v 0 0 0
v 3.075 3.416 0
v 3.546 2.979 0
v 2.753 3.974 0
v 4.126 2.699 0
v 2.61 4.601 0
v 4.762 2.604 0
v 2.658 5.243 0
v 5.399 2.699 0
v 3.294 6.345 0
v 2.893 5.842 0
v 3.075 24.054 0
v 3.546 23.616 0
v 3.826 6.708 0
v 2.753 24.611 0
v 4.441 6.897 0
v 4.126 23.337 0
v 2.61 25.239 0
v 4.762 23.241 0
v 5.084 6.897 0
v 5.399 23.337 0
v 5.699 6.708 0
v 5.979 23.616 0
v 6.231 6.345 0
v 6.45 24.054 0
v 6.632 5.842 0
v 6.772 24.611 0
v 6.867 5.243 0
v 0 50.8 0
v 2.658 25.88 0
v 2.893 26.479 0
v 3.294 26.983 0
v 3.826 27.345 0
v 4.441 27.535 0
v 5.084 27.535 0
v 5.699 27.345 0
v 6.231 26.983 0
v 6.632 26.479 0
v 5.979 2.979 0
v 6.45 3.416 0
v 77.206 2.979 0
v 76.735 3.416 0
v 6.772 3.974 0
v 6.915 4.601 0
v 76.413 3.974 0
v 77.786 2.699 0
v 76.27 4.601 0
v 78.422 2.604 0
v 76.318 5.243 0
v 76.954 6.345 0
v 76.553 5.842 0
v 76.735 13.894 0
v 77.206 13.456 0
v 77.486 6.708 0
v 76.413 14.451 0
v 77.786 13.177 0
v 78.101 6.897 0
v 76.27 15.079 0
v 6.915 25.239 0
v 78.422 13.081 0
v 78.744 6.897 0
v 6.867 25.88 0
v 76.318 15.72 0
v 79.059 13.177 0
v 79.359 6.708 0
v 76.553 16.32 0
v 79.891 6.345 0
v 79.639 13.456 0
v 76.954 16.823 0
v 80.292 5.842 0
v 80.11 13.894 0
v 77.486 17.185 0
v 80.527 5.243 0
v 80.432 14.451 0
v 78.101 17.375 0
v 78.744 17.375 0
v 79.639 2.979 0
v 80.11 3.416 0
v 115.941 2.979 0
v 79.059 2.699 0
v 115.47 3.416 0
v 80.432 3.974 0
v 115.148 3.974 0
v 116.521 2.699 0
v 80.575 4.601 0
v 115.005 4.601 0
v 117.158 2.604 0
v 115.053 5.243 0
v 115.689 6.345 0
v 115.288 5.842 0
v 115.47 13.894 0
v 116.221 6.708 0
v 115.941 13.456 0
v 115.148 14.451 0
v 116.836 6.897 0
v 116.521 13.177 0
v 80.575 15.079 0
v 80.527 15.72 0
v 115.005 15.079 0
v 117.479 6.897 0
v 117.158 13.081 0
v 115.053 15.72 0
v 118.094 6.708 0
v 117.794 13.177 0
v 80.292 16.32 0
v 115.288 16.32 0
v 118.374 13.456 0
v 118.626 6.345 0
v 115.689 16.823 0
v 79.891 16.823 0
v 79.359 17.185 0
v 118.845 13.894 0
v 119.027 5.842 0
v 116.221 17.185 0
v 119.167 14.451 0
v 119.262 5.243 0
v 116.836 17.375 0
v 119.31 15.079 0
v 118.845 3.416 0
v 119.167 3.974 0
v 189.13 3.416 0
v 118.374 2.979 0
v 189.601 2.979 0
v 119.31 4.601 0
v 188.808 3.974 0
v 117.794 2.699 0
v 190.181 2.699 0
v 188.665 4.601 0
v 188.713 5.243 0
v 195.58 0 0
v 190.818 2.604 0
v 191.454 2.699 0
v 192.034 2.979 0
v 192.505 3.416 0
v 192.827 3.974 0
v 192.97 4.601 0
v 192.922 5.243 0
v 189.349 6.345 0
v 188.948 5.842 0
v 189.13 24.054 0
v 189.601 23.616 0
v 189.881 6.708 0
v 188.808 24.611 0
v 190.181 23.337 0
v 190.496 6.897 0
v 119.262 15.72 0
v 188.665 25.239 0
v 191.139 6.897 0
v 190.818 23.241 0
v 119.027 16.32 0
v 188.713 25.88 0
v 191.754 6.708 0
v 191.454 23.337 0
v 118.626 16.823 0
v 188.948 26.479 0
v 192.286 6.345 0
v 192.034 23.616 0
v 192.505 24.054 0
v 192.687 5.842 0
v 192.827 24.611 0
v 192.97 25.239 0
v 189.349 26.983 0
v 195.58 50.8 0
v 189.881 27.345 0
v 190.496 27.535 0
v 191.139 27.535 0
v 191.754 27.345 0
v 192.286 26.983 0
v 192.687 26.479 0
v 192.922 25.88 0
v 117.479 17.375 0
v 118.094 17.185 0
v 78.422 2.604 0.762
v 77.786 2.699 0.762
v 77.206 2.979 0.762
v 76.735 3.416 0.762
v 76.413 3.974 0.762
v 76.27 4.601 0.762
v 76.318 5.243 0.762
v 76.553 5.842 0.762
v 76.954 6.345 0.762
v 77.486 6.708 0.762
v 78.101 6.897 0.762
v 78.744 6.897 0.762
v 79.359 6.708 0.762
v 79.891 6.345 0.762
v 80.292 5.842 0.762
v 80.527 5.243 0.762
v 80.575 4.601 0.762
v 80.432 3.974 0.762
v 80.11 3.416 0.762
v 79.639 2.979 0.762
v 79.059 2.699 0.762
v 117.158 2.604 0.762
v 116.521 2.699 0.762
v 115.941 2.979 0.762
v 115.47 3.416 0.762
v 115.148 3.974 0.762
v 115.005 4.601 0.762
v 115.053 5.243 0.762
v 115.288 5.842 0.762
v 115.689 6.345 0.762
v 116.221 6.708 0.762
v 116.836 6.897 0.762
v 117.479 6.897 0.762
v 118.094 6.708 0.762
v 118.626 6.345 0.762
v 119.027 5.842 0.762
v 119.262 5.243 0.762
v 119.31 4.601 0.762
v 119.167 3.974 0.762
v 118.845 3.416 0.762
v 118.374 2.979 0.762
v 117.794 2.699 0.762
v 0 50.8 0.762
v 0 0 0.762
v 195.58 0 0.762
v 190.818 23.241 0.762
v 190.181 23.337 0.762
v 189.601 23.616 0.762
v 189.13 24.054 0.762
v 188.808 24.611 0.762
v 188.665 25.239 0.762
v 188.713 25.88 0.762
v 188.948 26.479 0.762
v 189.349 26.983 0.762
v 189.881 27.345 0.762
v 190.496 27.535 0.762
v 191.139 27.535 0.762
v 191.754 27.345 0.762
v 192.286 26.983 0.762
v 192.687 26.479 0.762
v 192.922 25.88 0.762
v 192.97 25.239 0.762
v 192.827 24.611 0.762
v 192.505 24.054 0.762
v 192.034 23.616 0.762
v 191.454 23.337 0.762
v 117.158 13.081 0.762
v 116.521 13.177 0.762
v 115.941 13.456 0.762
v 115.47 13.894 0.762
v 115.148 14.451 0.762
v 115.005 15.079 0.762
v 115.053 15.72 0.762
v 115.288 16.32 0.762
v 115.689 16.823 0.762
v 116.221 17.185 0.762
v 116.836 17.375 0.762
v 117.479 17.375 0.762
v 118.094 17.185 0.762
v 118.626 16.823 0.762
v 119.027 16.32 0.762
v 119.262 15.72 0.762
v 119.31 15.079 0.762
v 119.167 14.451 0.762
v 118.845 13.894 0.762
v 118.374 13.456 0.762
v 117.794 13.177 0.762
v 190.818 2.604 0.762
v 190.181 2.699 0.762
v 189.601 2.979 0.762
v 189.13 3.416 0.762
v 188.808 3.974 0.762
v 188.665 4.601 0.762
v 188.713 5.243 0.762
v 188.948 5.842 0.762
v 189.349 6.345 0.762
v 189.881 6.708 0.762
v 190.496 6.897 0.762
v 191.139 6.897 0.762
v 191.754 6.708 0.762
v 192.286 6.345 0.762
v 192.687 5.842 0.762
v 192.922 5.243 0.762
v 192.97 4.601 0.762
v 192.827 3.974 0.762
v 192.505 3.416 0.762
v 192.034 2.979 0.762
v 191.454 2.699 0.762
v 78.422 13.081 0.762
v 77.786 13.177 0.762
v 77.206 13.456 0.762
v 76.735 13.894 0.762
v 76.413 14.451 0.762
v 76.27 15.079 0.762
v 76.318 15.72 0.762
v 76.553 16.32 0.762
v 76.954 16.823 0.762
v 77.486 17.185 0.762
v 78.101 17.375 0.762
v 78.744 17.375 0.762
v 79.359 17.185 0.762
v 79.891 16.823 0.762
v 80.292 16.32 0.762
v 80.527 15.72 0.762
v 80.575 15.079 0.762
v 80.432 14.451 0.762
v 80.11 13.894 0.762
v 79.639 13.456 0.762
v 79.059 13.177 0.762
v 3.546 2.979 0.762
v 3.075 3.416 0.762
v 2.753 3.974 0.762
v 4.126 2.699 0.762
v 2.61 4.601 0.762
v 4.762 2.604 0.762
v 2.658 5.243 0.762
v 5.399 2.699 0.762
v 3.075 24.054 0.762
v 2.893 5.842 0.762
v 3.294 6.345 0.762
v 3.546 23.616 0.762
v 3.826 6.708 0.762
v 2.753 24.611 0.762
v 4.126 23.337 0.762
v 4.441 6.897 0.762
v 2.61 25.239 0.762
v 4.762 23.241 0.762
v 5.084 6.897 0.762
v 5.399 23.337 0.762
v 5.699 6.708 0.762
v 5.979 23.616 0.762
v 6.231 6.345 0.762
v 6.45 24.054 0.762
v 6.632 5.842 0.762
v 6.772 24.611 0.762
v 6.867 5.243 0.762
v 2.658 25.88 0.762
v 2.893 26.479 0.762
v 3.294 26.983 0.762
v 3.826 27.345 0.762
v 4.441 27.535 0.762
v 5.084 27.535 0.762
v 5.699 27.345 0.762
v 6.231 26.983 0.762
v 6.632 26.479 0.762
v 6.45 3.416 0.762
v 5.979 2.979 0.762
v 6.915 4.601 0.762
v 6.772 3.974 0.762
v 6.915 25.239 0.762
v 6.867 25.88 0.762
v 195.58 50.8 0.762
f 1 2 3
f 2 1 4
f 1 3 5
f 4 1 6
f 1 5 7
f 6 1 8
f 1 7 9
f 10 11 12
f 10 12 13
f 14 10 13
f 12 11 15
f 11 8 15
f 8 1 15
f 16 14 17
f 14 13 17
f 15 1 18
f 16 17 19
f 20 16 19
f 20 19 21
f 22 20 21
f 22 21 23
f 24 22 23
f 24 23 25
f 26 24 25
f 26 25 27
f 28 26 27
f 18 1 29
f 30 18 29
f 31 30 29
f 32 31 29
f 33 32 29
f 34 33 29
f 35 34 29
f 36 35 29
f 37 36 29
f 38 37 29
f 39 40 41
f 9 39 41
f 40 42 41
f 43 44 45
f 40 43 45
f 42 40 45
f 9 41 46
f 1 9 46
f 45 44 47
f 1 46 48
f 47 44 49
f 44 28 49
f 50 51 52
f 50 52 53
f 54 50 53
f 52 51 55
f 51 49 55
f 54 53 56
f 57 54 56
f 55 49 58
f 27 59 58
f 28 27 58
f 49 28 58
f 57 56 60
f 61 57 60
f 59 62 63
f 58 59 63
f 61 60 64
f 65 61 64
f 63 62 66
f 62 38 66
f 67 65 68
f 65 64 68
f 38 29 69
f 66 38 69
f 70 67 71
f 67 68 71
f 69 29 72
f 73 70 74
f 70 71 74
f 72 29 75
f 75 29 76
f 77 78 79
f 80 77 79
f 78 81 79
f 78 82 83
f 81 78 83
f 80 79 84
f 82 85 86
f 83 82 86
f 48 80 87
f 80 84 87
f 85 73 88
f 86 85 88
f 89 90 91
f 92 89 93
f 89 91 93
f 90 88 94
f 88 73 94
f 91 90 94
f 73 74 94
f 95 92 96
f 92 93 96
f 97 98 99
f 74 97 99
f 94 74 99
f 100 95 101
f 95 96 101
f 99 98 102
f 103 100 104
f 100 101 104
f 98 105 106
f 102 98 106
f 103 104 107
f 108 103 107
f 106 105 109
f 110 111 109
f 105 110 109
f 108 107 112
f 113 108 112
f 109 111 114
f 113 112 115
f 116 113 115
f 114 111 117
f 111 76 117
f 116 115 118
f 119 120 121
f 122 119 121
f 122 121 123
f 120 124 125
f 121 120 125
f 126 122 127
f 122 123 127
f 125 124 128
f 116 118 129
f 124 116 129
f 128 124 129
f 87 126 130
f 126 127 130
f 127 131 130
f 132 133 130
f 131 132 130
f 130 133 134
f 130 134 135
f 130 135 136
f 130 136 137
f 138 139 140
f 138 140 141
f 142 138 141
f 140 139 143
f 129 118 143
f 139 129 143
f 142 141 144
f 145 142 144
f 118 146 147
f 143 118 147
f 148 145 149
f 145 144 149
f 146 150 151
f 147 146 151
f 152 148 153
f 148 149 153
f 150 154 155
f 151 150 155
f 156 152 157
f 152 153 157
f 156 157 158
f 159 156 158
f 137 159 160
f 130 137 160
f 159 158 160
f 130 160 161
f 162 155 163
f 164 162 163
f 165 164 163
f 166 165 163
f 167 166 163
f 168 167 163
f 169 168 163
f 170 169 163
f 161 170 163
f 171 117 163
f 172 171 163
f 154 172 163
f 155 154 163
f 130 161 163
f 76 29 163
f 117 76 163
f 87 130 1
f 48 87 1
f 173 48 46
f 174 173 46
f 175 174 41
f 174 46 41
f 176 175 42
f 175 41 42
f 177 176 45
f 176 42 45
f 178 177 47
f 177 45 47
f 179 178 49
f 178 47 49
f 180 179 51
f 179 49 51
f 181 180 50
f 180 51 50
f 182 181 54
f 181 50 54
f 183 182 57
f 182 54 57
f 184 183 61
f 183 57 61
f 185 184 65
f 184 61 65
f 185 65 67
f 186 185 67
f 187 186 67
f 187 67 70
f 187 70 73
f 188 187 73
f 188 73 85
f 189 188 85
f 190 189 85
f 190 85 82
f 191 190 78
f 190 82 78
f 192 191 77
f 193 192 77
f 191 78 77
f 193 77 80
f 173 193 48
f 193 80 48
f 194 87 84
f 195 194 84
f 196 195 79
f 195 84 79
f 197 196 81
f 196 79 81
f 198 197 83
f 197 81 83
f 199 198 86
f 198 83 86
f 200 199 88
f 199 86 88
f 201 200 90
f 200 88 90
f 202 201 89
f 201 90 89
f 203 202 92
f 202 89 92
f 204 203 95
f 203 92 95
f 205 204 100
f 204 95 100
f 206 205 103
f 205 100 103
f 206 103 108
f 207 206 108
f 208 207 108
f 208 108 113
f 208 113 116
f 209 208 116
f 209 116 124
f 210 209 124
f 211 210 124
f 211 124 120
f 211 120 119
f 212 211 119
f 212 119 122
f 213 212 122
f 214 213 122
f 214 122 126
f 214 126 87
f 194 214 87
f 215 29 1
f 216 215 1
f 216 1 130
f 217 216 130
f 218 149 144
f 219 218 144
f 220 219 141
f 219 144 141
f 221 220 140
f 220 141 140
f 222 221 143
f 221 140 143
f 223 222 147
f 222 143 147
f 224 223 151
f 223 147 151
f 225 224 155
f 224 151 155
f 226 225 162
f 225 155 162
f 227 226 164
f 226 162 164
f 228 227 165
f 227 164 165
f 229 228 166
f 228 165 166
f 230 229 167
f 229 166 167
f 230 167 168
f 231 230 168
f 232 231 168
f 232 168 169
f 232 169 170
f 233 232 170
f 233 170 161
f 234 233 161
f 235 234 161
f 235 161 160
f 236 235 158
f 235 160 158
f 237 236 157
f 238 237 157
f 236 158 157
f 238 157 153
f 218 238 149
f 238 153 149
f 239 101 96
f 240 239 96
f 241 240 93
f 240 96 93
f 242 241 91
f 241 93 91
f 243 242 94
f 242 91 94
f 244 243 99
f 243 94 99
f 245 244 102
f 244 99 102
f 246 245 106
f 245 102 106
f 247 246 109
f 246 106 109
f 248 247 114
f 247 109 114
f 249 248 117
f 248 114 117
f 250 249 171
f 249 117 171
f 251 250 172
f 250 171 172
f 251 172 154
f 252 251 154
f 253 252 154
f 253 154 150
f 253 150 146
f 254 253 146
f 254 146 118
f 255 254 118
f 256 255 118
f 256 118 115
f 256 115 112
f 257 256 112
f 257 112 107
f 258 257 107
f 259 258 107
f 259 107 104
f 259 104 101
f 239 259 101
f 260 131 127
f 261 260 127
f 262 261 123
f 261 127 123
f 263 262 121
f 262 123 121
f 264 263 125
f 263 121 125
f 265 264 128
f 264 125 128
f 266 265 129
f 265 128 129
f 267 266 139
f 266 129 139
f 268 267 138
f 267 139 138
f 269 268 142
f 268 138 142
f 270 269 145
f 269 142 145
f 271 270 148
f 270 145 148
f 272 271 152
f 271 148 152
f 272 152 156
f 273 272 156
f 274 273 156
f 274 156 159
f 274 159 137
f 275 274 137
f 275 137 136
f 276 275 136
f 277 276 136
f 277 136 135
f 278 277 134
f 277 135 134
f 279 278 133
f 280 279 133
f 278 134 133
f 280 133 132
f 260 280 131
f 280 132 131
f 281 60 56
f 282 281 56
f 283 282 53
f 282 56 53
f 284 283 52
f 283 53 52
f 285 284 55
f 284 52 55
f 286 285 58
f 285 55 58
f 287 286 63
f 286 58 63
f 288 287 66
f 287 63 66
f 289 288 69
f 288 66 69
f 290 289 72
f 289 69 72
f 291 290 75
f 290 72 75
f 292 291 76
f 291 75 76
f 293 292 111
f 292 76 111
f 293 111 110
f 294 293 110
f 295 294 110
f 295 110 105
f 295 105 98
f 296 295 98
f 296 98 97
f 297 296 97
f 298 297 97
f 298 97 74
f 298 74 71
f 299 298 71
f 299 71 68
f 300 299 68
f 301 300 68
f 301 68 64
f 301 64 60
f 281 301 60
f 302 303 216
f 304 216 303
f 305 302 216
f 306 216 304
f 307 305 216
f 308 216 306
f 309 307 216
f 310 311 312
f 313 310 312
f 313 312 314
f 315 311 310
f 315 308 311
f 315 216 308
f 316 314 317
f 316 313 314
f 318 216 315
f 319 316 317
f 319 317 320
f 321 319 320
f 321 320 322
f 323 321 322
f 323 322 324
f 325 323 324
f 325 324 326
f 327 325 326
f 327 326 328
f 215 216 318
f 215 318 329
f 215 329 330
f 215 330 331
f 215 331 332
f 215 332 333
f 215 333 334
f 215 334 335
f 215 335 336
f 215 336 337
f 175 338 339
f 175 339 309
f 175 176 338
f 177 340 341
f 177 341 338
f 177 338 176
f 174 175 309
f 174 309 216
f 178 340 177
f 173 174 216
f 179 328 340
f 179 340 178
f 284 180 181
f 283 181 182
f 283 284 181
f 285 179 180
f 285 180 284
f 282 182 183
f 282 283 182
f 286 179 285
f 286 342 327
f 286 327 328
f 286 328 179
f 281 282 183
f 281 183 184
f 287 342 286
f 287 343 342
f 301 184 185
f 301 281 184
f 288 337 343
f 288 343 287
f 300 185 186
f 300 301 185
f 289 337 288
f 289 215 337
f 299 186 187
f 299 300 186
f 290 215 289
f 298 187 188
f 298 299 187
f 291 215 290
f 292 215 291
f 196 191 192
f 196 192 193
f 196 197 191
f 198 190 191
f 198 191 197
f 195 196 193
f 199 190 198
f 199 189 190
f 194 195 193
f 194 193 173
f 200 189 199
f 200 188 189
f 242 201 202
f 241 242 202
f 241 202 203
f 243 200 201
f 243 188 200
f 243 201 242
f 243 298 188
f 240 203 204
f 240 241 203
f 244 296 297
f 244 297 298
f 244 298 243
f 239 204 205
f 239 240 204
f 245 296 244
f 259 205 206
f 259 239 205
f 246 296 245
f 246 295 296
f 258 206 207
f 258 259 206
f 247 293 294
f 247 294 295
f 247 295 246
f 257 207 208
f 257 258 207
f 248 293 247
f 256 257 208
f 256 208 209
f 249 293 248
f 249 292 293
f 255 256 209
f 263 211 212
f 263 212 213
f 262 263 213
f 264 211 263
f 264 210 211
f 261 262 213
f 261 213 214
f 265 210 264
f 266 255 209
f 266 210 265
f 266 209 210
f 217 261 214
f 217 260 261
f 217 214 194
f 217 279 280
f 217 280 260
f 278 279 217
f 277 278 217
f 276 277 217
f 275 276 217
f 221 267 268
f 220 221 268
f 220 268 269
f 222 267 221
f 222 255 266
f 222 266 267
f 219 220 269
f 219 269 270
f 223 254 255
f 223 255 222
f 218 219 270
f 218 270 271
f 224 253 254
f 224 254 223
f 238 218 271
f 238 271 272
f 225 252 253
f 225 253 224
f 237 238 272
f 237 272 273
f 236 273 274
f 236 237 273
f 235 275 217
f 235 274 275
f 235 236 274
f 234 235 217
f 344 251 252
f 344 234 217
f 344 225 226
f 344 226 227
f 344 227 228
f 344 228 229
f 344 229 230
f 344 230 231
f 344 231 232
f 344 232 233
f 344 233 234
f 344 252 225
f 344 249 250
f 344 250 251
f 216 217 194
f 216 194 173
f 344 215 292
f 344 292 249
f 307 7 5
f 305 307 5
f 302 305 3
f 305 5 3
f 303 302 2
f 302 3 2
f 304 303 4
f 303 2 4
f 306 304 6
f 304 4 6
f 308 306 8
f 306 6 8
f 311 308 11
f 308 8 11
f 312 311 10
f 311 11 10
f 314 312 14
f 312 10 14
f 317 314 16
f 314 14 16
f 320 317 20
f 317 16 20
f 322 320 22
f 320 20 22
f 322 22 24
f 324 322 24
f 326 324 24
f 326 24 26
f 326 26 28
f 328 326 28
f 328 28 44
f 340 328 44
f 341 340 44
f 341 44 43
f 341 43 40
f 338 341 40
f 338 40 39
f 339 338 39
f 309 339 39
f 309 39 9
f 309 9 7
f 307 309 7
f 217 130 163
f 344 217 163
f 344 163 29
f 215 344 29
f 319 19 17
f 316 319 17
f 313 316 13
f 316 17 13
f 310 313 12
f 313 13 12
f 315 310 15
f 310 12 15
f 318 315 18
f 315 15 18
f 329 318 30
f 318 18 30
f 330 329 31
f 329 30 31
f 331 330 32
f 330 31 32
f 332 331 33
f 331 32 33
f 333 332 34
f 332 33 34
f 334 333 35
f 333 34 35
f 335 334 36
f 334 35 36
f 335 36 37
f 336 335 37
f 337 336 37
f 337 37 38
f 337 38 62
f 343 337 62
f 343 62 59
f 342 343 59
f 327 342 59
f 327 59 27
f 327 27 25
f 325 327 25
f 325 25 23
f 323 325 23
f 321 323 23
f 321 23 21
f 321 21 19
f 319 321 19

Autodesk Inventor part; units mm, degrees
ref_plane "YZ Plane" through (0, 0, 0) normal (1, 0, 0) x (0, 1, 0)
ref_plane "XZ Plane" through (0, 0, 0) normal (0, 1, 0) x (-1, 0, 0)
ref_plane "XY Plane" through (0, 0, 0) normal (0, 0, 1) x (1, 0, 0)
sketch "Sketch1" plane through (0, 0, 0) normal (0, 0, 1) x (1, 0, 0)
  line L0 (0, 0) -> (195.58, 0)
  line L1 (195.58, 0) -> (195.58, 50.8)
  line L2 (195.58, 50.8) -> (0, 50.8)
  line L3 (0, 50.8) -> (0, 0)
  dimension "d0" = 195.58
  dimension "d1" = 50.8
extrude "Extrusion1" add sketch "Sketch1" along normal blind 0.762
sketch "Sketch2" plane through (0, 0, 0.762) normal (0, 0, 1) x (1, 0, 0)
  circle A0 centre (4.7625, 4.7625) radius 2.2479 projected
  circle A1 centre (78.4225, 4.7625) radius 2.2479 projected
  circle A2 centre (117.1575, 4.7625) radius 2.2479 projected
  circle A3 centre (190.8175, 4.7625) radius 2.2479 projected
hole "Hole1" at (4.7625, 4.7625, 0.762) at (78.4225, 4.7625, 0.762) at (117.1575, 4.7625, 0.762) at (190.8175, 4.7625, 0.762) direction (0, 0, -1) diameter 4.318 end through all clearance for "Flat Head Machine Screw (82)" size "#8" standard "Ansi Unified Screw Threads"
sketch "Sketch3" plane through (0, 0, 0.762) normal (0, 0, 1) x (1, 0, 0)
  line L0 (195.58, 0) -> (0, 0) projected
  point P0 (4.7625, 25.4)
  point P1 (78.4225, 15.24)
  point P2 (117.1575, 15.24)
  point P3 (190.8175, 25.4)
  dimension "d11" = 25.4
  dimension "d12" = 15.24
  dimension "d13" = 15.24
  dimension "d14" = 25.4
hole "Hole2" at (4.7625, 25.4, 0.762) at (78.4225, 15.24, 0.762) at (117.1575, 15.24, 0.762) at (190.8175, 25.4, 0.762) direction (0, 0, -1) diameter 4.318 end through all clearance for "Flat Head Machine Screw (82)" size "#8" standard "Ansi Unified Screw Threads"
properties part number "Blade" material "Steel"
